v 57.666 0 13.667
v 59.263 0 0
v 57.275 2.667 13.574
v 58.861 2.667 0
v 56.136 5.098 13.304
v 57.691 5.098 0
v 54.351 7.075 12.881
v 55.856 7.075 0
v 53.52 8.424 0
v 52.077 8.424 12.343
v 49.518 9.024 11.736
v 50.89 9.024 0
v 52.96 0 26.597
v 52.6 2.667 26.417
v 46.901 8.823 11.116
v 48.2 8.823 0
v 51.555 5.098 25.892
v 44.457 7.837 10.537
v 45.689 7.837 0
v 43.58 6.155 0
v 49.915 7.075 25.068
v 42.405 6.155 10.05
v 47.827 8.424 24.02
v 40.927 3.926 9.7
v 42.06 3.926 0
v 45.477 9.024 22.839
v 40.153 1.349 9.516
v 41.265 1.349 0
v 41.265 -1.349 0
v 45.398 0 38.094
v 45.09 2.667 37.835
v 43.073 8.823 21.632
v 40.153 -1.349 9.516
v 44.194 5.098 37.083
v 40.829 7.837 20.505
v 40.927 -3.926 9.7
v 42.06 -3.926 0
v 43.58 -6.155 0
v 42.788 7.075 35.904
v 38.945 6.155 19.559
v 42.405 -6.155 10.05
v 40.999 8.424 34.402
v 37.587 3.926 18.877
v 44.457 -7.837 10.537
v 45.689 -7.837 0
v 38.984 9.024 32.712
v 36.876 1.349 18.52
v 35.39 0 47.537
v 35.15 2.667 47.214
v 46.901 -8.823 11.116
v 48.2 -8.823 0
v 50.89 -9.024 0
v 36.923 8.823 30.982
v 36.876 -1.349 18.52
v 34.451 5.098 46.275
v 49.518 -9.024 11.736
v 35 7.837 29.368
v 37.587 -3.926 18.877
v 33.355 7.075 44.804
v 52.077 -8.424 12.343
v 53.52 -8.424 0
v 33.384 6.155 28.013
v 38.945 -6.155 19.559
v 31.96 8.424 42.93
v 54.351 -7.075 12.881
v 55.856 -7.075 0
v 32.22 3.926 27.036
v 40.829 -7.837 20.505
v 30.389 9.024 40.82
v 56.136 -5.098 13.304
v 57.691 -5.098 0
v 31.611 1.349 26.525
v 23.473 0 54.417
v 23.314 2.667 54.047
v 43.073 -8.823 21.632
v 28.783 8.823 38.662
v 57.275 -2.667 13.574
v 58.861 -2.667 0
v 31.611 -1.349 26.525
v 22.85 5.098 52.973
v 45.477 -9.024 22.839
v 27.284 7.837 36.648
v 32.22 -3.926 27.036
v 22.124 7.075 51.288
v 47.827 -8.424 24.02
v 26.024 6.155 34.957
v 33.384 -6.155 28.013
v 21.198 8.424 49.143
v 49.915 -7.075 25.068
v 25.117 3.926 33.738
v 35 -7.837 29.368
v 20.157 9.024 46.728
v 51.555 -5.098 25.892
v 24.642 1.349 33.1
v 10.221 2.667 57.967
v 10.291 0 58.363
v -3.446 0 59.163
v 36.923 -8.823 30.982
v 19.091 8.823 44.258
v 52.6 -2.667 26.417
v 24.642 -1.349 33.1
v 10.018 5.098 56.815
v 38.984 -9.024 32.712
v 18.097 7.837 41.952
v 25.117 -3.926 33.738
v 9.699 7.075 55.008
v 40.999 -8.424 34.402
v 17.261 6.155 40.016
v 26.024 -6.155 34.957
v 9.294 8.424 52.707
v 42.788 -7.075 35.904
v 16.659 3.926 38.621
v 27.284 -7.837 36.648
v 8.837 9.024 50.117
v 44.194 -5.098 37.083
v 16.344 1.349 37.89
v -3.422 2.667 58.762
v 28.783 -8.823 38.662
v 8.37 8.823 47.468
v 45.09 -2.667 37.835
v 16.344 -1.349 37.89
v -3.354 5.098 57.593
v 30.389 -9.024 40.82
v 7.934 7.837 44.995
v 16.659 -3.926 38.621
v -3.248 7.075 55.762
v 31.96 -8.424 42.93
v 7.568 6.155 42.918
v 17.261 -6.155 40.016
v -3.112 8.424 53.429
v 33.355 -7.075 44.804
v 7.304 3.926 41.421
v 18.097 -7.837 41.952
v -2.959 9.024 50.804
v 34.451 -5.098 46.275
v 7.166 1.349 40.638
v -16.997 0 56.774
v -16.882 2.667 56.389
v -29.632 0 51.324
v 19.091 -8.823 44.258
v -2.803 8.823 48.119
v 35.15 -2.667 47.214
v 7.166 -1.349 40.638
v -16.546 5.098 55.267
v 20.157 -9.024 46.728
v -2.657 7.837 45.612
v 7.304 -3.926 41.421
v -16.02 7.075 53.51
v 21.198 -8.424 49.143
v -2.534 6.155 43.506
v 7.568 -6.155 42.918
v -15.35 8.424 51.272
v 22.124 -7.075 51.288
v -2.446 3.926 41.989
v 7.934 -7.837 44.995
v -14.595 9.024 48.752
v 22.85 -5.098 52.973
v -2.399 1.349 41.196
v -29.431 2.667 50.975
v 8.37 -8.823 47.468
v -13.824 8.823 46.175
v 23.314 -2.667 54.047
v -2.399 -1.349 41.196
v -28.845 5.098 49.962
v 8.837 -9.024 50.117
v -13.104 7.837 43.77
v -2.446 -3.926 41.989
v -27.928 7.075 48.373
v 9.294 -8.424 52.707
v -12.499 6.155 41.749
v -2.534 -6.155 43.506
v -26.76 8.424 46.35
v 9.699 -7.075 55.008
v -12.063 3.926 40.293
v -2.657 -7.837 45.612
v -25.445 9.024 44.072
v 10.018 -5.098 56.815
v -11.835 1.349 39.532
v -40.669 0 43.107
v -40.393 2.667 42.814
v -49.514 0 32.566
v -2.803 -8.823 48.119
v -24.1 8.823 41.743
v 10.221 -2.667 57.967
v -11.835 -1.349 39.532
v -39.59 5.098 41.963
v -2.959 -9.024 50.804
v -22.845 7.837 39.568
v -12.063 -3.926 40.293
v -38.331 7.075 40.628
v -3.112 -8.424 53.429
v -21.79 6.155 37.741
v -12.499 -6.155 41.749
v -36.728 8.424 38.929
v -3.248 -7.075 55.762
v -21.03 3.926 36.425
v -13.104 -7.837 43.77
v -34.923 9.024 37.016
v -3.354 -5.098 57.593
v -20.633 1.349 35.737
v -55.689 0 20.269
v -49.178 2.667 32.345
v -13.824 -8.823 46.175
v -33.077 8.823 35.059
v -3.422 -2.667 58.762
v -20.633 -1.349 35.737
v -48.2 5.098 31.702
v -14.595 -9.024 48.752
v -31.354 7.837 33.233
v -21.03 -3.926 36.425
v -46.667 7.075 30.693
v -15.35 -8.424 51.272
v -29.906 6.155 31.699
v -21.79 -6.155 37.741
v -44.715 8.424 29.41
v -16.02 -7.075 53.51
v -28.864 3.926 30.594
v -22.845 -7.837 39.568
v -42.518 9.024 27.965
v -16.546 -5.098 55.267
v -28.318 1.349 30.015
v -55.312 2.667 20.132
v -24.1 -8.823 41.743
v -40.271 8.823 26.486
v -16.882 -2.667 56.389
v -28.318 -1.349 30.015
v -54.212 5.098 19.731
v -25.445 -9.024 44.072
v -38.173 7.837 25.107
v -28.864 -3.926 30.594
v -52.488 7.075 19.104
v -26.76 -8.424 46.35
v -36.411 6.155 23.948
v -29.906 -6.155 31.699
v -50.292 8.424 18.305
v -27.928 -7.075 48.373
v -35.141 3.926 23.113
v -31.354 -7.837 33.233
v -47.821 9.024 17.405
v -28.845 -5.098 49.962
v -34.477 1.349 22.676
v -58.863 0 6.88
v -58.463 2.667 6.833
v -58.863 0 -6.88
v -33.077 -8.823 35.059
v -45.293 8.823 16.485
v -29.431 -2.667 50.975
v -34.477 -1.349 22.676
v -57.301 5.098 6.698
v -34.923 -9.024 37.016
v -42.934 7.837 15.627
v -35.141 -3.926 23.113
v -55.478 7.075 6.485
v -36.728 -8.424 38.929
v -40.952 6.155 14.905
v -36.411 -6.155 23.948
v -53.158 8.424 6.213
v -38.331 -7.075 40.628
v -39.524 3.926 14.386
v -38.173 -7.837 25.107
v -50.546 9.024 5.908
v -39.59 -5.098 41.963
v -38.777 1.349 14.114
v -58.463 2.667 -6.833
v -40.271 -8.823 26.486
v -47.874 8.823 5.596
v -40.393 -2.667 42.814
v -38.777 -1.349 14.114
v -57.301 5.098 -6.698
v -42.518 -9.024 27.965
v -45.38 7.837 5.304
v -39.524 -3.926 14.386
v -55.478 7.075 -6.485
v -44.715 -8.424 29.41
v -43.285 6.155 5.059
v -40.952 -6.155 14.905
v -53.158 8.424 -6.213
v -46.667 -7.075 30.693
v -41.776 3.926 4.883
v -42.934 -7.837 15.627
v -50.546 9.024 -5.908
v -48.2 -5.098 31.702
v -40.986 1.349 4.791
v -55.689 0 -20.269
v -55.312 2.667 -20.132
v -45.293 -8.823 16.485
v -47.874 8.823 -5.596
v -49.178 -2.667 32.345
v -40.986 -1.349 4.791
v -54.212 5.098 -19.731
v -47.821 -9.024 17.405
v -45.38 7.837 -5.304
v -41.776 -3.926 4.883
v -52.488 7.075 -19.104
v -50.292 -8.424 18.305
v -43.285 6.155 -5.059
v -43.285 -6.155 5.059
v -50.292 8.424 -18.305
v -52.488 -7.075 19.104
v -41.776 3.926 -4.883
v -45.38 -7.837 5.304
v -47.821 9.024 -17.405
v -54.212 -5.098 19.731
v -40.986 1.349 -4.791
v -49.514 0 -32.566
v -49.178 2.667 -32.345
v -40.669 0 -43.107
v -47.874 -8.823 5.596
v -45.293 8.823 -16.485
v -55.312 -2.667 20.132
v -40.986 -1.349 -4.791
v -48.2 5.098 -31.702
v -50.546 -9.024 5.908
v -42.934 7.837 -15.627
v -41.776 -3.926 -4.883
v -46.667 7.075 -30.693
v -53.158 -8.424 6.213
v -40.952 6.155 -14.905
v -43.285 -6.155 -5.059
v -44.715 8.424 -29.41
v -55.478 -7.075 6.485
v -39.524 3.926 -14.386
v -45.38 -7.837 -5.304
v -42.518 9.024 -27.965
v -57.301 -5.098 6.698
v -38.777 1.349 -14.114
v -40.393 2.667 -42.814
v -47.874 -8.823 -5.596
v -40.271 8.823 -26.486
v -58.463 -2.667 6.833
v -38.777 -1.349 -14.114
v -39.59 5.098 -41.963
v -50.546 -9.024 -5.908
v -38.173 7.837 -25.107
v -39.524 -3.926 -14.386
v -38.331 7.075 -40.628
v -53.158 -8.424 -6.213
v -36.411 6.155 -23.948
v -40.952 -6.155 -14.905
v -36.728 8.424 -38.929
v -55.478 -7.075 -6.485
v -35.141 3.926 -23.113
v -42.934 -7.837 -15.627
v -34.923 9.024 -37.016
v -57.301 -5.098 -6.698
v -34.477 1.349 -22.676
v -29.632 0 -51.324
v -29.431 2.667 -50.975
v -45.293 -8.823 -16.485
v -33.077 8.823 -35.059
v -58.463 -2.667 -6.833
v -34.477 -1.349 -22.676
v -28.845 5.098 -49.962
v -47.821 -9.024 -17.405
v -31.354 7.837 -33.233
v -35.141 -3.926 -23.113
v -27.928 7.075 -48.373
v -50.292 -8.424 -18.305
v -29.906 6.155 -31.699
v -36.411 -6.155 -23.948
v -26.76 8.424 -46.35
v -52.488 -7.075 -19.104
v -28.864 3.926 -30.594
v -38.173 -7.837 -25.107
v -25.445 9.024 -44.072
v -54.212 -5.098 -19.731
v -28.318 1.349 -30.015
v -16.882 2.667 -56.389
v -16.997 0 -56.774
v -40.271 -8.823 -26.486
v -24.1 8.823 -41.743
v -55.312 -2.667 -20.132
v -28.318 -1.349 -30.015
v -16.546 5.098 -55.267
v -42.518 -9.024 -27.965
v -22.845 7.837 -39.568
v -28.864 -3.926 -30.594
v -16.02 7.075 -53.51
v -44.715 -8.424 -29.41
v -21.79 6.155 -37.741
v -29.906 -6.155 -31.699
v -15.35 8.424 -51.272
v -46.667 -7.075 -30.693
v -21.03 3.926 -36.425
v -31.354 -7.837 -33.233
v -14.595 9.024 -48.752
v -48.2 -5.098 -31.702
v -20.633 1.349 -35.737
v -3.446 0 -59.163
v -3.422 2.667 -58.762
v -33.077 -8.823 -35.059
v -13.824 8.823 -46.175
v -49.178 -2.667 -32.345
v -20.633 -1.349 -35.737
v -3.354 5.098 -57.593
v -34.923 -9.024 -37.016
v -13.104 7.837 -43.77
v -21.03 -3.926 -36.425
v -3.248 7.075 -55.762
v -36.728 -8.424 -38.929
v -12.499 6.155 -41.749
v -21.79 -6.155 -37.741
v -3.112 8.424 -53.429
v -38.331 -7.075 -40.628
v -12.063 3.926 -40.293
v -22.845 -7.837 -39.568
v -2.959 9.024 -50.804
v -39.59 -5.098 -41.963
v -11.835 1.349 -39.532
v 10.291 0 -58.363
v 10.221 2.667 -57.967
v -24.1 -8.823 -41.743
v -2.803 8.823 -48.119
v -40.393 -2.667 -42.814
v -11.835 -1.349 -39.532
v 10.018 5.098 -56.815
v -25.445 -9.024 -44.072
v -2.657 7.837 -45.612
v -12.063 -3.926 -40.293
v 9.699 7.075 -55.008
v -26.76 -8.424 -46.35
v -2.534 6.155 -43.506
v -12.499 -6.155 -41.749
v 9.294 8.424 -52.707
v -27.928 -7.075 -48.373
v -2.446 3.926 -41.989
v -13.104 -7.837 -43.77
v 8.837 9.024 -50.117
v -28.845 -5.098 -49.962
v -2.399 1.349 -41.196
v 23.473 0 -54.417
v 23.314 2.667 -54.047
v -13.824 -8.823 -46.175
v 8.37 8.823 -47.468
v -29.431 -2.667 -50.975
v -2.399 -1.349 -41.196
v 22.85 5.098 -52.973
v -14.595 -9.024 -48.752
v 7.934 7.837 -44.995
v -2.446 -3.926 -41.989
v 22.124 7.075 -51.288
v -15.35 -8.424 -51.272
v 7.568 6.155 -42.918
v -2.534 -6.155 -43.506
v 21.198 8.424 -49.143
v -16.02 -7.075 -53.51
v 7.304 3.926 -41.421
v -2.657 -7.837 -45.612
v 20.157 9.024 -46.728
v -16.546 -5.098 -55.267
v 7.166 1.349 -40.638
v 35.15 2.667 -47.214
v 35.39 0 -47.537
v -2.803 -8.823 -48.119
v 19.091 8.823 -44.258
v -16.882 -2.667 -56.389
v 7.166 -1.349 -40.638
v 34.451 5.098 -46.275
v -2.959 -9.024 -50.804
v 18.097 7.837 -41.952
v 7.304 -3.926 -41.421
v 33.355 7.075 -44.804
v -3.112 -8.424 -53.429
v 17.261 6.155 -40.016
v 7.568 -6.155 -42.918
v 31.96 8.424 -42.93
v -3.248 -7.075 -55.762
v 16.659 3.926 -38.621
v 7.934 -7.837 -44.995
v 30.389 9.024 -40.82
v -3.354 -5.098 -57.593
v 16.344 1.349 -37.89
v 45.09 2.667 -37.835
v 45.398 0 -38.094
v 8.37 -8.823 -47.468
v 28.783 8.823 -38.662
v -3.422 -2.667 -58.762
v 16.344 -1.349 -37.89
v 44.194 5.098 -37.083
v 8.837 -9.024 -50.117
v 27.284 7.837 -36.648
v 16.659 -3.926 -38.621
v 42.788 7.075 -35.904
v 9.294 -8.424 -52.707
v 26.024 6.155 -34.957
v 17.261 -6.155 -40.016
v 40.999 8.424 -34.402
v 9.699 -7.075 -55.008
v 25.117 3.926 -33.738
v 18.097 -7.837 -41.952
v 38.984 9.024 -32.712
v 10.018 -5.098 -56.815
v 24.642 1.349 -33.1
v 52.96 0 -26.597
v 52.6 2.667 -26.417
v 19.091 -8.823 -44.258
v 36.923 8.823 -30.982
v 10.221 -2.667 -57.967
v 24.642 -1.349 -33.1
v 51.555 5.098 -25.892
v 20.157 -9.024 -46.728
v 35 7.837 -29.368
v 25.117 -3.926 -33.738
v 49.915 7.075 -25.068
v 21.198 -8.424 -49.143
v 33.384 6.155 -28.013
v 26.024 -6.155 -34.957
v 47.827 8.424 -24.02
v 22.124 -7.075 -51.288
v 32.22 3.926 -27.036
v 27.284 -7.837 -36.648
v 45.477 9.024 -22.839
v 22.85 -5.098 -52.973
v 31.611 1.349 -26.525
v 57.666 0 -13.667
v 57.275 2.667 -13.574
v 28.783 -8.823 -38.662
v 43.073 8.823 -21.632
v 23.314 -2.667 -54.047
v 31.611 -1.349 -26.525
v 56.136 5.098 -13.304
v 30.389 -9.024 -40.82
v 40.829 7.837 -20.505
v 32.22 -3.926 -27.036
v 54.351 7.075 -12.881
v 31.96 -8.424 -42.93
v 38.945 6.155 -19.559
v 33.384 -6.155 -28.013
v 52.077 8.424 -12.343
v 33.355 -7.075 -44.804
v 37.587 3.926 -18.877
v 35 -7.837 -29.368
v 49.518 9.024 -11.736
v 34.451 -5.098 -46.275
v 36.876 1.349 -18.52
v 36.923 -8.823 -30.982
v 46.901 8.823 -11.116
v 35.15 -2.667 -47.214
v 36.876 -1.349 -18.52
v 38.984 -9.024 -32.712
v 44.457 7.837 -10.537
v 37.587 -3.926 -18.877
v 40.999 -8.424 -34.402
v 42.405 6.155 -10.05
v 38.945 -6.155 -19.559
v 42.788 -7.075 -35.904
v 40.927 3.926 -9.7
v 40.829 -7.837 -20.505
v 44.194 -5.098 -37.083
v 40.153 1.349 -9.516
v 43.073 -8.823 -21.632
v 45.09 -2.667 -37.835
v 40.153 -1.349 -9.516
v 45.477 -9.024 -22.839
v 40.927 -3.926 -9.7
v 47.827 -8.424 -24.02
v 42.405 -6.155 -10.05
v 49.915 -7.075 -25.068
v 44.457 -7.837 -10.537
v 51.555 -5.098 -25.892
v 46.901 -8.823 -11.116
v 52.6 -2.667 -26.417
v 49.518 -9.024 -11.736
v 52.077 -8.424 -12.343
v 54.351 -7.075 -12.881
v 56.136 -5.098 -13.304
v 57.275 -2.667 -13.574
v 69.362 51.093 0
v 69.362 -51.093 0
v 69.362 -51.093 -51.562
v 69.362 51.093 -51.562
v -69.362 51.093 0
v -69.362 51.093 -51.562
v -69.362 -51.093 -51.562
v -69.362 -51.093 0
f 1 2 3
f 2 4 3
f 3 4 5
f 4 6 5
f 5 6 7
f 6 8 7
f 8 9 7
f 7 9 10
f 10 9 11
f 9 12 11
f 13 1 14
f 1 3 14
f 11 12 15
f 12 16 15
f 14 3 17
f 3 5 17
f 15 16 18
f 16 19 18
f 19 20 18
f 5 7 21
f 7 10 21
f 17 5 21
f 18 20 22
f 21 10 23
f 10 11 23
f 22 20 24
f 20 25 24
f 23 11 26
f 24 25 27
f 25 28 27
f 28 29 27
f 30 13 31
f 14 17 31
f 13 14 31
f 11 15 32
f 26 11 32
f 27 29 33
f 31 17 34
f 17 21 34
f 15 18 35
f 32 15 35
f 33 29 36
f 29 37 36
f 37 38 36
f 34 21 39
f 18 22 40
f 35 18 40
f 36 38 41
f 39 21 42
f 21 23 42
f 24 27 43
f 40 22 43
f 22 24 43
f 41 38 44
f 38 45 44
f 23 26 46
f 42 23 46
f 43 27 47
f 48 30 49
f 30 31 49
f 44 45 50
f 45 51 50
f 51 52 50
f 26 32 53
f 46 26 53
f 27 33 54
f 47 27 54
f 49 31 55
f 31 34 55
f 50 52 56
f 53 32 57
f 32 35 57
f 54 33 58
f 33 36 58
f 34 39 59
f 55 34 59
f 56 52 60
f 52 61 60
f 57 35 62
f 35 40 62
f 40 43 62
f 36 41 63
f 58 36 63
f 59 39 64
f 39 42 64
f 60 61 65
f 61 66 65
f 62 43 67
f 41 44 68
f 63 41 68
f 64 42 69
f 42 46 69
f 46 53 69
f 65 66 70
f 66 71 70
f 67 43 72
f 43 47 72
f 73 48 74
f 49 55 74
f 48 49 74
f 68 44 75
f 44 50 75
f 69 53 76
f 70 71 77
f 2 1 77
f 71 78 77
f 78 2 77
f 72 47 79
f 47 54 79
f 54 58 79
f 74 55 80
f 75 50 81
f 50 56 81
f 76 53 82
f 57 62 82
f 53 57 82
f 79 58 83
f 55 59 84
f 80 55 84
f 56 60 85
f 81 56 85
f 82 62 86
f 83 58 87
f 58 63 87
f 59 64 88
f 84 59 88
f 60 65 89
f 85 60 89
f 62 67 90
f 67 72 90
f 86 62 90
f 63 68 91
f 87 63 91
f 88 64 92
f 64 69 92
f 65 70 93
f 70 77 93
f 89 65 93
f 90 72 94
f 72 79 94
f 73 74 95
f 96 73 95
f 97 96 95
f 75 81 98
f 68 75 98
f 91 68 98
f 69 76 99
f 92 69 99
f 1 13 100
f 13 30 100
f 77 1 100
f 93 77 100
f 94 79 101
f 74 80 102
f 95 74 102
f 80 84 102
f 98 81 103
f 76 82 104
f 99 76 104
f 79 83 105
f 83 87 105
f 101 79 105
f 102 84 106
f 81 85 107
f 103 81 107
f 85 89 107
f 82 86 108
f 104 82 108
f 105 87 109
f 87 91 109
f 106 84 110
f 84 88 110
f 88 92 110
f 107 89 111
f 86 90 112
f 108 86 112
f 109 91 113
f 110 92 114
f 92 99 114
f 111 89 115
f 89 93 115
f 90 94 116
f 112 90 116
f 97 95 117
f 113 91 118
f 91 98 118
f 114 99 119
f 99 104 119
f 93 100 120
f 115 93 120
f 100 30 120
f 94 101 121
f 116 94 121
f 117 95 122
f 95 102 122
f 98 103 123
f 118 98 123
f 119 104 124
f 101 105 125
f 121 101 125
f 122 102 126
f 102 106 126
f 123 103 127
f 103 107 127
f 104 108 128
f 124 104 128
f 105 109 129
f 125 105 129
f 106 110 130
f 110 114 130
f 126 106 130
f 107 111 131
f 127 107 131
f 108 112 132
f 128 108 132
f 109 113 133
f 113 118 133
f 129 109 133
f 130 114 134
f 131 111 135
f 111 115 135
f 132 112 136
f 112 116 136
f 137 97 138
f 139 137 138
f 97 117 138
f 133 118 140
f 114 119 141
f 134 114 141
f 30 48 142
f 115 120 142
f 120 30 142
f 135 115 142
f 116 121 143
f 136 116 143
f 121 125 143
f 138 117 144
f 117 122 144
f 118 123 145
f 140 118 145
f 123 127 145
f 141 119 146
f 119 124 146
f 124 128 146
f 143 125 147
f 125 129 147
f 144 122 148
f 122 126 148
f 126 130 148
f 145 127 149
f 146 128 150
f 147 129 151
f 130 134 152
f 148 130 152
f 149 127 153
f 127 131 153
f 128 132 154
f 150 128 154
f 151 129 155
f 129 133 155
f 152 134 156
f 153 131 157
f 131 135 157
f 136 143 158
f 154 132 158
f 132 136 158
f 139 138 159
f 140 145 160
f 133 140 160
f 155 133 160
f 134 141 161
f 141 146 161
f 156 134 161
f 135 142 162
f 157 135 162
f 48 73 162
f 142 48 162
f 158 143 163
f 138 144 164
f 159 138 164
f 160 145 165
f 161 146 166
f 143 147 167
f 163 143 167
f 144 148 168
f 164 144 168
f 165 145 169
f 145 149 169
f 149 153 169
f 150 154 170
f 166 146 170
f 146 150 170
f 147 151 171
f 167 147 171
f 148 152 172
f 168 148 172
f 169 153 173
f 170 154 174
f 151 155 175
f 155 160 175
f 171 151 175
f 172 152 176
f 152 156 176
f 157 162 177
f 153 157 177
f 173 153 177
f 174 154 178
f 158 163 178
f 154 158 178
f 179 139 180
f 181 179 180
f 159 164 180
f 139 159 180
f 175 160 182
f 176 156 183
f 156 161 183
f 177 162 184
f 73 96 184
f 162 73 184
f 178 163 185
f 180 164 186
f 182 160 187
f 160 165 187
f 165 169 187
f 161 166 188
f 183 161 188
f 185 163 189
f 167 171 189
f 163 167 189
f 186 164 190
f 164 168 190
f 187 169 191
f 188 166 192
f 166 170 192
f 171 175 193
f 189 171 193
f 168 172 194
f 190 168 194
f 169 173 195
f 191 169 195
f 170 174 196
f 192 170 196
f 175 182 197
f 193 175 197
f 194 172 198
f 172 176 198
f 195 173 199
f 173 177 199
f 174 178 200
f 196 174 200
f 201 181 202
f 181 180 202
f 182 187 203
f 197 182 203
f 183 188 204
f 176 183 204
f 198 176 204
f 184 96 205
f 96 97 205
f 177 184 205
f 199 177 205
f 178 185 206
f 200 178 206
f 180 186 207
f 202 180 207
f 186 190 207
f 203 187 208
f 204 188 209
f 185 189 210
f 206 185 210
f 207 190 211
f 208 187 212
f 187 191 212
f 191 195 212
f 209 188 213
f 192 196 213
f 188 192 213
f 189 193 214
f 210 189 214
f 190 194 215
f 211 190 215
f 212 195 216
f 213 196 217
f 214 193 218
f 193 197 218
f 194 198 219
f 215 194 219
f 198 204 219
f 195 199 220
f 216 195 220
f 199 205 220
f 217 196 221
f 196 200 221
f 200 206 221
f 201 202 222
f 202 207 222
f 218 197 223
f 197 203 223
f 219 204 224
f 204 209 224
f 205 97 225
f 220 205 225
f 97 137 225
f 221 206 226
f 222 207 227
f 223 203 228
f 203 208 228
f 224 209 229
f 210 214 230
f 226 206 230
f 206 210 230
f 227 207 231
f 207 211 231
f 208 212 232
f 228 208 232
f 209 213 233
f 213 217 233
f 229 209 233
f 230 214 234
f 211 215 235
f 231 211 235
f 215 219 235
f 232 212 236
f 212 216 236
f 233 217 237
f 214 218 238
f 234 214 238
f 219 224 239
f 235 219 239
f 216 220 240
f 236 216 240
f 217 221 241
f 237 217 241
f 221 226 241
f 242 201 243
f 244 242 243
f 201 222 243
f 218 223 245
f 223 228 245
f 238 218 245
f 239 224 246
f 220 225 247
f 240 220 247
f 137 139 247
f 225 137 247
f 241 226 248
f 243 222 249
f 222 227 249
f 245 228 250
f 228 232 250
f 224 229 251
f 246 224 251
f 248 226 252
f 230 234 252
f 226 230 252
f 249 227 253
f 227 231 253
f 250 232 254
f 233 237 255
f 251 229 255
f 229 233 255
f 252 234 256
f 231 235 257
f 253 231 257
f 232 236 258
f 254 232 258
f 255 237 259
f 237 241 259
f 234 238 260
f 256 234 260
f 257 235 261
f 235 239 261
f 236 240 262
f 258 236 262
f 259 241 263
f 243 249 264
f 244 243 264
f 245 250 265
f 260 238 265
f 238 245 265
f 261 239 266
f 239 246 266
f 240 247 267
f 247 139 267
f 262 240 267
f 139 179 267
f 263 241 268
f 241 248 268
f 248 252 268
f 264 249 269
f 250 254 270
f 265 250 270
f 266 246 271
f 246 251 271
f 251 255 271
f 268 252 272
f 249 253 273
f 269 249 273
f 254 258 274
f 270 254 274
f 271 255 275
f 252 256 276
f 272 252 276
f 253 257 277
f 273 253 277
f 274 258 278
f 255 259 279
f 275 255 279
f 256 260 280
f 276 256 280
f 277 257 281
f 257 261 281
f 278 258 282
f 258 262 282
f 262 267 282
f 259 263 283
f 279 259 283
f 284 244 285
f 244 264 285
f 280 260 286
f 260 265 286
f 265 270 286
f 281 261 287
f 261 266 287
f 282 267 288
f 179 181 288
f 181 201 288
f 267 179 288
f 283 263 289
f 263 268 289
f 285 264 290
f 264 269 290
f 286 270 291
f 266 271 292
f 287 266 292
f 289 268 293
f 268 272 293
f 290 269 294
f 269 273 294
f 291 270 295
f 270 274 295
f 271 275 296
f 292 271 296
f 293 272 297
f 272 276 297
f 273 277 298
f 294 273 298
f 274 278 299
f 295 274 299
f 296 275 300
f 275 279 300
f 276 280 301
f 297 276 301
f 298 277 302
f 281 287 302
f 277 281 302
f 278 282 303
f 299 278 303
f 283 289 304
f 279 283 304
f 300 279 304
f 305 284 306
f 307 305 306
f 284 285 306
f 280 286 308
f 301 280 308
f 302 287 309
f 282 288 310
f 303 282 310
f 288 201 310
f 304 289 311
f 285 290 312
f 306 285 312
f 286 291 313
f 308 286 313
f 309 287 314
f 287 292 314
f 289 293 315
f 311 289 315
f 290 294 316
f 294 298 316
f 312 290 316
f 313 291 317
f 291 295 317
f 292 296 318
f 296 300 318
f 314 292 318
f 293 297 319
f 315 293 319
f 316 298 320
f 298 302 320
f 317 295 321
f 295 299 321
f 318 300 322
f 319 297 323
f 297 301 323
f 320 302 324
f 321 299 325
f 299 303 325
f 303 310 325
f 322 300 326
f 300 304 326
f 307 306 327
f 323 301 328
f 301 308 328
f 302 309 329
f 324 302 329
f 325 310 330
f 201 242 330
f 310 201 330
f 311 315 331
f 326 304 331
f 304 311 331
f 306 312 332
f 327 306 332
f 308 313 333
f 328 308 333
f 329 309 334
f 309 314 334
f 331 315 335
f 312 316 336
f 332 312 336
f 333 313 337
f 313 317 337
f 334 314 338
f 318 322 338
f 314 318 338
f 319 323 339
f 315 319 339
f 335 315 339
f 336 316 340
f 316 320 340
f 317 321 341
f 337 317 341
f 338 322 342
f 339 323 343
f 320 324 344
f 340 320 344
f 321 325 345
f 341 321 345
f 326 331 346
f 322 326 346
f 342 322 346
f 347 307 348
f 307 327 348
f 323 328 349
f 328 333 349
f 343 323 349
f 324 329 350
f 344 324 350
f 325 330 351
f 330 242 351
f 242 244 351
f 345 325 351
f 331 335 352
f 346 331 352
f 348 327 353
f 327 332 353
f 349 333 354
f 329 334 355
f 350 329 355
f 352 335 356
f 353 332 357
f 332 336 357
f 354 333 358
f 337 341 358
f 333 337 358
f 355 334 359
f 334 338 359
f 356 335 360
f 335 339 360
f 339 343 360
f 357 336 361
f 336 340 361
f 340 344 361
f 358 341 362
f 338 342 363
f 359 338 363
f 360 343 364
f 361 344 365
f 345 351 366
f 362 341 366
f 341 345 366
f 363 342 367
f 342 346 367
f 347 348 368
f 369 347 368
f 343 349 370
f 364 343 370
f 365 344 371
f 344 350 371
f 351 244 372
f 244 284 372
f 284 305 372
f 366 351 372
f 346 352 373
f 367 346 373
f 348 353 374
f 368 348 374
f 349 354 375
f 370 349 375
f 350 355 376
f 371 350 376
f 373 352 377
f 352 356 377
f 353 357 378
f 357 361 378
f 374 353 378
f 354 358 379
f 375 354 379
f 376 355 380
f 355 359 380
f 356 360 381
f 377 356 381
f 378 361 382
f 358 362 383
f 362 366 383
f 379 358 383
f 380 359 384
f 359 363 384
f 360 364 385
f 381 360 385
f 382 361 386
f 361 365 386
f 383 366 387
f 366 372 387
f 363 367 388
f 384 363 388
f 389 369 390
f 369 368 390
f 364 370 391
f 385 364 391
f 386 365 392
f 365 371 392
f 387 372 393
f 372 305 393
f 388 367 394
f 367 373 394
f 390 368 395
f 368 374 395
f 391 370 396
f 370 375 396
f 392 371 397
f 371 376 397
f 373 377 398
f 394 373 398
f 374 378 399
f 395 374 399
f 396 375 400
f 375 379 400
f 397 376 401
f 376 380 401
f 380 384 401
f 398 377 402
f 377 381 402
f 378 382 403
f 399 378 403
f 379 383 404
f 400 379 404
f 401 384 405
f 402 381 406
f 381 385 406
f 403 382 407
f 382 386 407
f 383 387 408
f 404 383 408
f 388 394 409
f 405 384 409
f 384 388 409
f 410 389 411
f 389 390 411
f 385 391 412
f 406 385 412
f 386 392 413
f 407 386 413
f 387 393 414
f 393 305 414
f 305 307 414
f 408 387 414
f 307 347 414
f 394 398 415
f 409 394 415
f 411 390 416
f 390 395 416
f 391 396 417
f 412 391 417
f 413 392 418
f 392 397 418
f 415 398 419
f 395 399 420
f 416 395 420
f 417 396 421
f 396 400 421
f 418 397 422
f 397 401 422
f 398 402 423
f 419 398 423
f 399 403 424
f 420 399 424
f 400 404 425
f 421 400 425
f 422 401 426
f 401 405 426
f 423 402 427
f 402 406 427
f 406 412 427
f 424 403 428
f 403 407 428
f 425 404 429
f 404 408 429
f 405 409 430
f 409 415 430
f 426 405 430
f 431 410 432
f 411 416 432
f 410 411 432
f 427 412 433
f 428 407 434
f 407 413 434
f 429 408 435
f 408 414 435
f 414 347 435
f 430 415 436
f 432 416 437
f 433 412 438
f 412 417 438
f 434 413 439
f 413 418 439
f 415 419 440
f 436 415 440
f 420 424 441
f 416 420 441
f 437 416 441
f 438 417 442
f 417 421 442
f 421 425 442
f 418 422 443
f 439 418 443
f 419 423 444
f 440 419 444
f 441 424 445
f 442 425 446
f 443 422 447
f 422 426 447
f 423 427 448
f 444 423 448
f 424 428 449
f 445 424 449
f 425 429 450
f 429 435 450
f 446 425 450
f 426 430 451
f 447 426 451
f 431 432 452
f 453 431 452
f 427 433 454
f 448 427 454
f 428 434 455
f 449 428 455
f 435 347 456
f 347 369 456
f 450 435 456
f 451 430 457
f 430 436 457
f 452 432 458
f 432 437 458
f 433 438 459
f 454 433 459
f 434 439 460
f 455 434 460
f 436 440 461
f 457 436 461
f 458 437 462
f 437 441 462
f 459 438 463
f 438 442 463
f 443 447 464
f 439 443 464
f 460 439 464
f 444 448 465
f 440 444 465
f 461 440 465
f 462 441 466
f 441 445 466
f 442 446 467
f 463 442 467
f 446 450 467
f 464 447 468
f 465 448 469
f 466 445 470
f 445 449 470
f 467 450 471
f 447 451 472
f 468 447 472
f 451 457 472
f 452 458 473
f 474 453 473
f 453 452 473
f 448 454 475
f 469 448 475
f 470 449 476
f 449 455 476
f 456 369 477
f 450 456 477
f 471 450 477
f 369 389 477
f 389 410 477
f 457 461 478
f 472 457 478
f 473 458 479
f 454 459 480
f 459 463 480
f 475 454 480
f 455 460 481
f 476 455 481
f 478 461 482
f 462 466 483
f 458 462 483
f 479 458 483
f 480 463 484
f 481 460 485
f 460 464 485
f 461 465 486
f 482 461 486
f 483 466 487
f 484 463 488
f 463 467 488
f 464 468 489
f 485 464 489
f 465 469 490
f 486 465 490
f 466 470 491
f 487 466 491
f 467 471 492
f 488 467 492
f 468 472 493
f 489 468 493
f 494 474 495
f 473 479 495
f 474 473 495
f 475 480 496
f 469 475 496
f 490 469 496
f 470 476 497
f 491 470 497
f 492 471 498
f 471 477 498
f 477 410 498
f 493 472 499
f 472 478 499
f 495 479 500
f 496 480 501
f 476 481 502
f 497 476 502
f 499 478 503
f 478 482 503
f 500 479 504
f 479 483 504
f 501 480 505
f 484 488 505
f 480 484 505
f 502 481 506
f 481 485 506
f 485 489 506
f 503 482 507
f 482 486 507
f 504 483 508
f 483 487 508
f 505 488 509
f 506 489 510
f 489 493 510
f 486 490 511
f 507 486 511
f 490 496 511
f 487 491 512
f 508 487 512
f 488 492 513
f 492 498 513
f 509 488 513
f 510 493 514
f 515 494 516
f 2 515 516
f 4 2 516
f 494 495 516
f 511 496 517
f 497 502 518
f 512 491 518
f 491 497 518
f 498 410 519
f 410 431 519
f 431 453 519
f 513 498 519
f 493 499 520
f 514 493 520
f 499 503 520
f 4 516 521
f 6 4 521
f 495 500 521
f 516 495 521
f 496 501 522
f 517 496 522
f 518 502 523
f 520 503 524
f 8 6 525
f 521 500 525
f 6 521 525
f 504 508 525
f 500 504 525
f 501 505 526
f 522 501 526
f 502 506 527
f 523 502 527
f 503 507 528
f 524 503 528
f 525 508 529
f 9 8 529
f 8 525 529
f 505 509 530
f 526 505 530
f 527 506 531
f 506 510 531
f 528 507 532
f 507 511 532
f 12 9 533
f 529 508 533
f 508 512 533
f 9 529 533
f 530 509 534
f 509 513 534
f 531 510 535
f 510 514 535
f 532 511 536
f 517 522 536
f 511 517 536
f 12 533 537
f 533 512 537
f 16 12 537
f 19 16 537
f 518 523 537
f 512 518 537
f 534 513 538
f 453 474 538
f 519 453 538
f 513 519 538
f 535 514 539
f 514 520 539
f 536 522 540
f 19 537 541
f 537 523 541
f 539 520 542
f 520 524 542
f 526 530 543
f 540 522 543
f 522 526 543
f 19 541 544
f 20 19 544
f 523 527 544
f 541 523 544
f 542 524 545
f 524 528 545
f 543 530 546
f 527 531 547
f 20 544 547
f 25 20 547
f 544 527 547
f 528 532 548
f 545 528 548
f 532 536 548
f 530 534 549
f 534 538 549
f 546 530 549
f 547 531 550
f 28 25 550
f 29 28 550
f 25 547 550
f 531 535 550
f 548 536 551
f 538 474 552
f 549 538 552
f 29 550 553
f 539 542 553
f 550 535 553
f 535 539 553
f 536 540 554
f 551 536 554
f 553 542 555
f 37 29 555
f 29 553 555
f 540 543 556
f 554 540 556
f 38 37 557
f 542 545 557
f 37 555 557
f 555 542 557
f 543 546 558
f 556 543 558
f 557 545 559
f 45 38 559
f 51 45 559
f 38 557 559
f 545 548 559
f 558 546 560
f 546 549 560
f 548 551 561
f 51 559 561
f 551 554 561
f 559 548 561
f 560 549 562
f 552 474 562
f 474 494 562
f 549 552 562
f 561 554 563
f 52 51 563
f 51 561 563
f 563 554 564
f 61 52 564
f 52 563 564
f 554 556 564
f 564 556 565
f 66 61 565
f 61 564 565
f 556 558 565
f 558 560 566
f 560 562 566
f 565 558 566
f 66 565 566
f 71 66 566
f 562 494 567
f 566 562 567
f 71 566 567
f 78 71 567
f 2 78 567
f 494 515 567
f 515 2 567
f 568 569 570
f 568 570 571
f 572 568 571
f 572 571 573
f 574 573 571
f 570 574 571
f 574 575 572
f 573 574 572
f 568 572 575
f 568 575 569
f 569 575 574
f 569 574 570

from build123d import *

# Parameters (mm, degrees)
F0_W     = 69.361538
F0_H     = 102.186158
F2_DEPTH = 51.562
F1_R     = 9.049601


with BuildPart() as f2:
    # F0 (on Top) → F2 (new body)
    with BuildSketch(Plane.XY):
        with Locations((34.680769, 0)):
            Rectangle(F0_W, F0_H)
        with Locations((-34.680769, 0)):
            Rectangle(F0_W, F0_H)
    extrude(amount=-F2_DEPTH)


with BuildPart() as f3:
    # F1 (on Top) → F3 (revolve)
    with BuildSketch(Plane.XY):
        with Locations((50.213844, 0)):
            Circle(F1_R)
    revolve(axis=Axis((0, 0, 0), (0, -1, 0)))


solid = Compound([f2.part, f3.part])
